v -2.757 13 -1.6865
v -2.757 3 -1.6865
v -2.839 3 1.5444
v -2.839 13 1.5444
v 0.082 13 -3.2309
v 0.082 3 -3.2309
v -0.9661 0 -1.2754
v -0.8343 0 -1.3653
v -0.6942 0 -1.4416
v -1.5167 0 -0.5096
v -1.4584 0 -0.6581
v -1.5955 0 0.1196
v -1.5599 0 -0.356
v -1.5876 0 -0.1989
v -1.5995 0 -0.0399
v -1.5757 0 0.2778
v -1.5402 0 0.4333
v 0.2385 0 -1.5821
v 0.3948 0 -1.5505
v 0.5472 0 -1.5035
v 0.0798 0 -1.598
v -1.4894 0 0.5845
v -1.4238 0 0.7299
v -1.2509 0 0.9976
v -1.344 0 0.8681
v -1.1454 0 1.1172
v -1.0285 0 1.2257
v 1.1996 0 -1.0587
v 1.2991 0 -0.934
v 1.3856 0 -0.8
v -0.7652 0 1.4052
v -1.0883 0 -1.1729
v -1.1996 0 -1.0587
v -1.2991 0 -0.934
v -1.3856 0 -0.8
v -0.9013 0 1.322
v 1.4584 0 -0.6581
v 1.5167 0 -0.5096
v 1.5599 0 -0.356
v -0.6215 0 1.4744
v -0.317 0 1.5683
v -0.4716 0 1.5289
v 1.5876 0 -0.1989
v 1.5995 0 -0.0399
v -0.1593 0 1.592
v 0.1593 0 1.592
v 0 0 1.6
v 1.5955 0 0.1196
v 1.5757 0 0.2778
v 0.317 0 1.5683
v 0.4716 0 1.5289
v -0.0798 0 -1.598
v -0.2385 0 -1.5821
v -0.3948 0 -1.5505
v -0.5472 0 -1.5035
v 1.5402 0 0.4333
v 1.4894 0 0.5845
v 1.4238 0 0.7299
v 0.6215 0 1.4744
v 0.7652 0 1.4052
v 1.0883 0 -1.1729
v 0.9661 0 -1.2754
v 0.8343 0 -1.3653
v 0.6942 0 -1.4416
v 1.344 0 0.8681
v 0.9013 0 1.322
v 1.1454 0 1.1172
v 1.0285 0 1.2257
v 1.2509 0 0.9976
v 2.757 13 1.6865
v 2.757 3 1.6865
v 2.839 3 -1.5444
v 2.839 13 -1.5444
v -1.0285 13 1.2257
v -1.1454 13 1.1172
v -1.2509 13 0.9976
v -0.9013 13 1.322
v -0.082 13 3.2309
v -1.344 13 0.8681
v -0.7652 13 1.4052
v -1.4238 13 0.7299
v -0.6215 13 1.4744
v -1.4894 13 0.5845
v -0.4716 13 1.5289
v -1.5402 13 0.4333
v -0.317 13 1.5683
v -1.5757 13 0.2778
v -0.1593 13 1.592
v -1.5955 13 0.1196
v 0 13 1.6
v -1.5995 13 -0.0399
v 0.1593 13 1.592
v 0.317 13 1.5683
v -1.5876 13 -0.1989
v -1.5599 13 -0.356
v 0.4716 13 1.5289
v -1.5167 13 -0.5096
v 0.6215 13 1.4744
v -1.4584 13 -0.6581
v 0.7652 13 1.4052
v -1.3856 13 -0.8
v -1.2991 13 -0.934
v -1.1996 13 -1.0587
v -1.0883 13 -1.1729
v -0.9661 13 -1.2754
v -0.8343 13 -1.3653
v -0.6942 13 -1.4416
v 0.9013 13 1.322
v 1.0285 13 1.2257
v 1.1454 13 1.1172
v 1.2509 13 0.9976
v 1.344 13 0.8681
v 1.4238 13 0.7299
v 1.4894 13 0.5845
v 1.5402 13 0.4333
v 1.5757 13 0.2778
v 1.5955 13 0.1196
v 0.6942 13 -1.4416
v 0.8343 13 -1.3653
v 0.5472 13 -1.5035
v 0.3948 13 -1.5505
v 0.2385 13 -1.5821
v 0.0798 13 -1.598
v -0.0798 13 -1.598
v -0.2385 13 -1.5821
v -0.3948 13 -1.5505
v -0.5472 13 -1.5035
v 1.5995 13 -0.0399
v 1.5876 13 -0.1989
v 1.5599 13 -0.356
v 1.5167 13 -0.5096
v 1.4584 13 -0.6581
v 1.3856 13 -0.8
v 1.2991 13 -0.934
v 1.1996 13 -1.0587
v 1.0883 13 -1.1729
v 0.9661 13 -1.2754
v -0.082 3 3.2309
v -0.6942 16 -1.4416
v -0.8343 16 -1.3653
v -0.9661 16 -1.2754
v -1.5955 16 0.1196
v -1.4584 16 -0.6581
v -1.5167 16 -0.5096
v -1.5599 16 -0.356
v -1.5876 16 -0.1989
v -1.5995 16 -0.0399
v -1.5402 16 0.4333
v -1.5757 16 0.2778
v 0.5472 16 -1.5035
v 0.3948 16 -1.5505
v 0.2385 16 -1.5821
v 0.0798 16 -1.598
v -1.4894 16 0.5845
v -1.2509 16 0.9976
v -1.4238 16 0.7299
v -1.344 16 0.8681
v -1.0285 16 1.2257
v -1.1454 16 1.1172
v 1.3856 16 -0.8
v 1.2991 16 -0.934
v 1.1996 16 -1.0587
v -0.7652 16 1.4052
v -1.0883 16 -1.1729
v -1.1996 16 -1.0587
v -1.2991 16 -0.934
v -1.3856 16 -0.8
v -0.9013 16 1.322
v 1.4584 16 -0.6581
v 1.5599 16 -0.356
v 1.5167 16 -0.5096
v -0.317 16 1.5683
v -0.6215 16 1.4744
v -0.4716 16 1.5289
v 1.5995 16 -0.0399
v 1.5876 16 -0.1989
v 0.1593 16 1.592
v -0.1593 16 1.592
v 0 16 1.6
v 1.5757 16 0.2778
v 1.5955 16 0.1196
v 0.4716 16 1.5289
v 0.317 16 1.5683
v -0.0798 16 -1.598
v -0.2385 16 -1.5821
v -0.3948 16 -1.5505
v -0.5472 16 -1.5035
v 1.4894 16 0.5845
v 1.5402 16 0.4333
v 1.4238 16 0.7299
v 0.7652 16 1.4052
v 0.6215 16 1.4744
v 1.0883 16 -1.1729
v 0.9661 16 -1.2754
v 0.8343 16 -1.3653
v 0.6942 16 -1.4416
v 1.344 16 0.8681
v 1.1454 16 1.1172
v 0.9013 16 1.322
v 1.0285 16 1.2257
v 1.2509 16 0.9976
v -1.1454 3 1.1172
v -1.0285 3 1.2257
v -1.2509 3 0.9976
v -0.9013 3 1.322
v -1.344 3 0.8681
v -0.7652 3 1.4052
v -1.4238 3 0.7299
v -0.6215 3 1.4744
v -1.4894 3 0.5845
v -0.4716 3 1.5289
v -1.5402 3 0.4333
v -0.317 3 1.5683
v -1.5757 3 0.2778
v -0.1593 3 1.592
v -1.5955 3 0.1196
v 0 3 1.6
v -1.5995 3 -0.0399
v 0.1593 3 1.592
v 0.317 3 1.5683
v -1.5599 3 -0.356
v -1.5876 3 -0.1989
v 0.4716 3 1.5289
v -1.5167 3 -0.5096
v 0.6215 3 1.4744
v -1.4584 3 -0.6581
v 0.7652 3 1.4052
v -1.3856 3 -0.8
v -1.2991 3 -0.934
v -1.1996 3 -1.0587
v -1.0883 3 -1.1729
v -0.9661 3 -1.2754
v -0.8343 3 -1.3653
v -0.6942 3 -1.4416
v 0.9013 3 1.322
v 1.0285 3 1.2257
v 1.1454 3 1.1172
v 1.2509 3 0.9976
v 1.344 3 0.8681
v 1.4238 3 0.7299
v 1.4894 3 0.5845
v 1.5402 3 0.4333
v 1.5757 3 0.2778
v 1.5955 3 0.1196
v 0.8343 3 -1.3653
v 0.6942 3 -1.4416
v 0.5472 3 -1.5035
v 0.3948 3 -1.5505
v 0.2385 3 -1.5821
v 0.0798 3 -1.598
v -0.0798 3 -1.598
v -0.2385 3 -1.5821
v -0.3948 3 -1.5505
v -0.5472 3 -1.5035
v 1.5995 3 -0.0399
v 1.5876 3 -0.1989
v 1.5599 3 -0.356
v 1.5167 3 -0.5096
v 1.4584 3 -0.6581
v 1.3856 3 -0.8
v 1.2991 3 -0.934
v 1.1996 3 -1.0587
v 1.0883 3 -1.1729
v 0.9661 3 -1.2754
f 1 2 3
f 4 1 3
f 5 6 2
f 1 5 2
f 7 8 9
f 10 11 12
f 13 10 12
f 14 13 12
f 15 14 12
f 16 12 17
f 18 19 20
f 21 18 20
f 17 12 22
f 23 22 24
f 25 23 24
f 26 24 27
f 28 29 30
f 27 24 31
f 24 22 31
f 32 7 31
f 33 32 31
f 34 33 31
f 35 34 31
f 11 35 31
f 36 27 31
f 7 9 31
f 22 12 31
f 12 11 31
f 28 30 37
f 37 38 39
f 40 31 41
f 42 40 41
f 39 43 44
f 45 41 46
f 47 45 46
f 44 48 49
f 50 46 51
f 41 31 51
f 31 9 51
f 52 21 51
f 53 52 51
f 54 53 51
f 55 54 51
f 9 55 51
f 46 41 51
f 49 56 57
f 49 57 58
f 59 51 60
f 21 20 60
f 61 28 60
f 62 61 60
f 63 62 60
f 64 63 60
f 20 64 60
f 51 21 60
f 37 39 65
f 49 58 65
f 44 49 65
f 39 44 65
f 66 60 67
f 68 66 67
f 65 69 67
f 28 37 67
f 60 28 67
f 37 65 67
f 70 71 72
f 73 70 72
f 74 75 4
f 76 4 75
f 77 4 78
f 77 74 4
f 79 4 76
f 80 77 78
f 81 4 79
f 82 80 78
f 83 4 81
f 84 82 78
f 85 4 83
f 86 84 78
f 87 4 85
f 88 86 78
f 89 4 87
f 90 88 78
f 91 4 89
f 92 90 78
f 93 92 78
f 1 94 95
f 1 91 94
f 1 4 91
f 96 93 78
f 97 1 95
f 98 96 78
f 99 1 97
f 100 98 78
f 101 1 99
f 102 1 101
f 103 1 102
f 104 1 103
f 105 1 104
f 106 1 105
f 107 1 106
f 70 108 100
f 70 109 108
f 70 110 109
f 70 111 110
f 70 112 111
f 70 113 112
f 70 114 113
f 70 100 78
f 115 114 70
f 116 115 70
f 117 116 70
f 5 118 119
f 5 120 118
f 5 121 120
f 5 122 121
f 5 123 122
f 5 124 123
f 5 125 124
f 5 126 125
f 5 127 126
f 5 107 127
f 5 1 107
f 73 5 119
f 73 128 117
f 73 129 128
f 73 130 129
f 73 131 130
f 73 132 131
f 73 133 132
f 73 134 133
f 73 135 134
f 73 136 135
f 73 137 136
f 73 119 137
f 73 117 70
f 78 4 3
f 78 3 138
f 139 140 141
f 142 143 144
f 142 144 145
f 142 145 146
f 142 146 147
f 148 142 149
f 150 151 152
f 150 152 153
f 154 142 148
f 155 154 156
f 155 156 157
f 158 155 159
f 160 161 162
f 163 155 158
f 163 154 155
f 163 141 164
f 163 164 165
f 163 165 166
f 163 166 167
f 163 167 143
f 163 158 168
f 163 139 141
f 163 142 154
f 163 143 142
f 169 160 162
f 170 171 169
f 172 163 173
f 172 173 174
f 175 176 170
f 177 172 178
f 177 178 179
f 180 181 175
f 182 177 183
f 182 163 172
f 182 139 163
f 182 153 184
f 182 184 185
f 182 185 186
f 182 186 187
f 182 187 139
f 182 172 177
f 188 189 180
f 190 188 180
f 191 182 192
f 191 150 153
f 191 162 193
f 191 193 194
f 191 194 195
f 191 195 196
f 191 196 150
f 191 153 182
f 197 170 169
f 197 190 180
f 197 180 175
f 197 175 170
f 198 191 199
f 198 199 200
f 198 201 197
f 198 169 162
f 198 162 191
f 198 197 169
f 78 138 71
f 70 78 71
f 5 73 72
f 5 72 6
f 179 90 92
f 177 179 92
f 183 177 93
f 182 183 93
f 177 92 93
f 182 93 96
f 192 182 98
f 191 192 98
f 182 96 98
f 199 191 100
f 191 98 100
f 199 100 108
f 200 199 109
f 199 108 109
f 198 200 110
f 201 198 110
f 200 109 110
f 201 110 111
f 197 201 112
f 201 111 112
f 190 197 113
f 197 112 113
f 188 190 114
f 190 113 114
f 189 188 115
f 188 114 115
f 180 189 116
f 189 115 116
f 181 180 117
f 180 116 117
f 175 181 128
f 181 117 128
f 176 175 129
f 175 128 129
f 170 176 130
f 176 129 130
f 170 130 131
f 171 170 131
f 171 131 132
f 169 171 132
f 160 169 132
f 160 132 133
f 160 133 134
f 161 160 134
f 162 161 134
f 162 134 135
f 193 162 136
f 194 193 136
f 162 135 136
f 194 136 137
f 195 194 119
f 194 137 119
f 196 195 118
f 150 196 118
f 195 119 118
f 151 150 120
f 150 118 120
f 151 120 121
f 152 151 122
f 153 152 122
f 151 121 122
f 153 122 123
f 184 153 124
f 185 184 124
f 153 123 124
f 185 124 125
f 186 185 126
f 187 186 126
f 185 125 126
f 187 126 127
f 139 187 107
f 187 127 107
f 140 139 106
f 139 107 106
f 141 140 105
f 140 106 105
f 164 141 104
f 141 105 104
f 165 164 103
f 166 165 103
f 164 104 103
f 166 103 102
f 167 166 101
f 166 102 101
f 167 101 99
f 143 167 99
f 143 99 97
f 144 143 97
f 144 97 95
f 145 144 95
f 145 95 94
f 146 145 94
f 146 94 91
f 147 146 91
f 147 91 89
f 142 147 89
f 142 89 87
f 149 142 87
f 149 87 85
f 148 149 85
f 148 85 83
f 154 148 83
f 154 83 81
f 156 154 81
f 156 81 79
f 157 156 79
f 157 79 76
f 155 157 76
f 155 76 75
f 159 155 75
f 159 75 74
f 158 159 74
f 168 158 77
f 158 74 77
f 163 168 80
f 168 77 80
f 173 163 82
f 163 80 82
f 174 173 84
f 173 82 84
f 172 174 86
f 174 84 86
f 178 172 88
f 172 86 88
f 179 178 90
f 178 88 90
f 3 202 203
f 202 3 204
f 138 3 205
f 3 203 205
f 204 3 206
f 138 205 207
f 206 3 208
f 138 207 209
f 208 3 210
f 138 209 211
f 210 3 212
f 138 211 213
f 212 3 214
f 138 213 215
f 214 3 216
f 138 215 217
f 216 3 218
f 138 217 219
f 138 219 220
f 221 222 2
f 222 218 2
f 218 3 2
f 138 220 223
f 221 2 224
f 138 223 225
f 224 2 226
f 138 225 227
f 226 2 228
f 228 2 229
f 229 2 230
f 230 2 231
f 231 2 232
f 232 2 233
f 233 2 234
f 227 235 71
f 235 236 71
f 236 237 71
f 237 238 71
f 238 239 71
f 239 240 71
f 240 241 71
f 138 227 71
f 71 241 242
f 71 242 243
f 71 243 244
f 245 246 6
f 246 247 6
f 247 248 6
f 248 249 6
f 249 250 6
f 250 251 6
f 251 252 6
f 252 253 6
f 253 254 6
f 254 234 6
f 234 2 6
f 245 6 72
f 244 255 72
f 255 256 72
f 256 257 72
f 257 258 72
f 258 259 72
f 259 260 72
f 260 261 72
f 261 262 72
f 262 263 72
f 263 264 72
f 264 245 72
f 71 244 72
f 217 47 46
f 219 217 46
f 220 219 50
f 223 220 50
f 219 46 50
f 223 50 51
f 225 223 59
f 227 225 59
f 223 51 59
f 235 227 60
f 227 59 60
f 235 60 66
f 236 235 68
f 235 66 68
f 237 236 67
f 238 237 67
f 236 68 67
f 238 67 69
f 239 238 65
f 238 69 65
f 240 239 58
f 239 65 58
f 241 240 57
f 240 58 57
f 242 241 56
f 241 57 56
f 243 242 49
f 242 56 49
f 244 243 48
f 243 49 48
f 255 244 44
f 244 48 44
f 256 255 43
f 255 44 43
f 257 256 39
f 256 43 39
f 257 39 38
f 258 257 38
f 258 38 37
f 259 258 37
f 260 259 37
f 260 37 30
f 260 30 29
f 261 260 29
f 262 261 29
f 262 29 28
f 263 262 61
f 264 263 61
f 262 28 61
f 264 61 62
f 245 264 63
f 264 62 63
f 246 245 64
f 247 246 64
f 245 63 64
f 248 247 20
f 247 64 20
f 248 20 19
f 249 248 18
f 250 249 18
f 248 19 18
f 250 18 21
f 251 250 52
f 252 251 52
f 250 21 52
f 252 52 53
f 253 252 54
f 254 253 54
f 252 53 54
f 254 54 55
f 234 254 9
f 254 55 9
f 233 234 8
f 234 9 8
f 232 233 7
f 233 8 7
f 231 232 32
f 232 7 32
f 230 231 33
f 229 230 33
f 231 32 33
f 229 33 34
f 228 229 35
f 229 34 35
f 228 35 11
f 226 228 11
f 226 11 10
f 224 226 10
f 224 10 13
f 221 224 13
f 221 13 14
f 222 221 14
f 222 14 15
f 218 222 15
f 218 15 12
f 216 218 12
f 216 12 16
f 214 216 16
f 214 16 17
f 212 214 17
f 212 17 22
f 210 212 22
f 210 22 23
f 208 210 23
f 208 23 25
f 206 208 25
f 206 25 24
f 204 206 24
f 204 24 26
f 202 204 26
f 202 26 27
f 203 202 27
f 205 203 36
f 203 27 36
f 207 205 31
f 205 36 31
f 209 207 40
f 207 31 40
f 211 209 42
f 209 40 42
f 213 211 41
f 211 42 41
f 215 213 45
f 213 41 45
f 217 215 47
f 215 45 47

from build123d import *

# Parameters (mm, degrees)
SKETCH_1_R      = 1.6
EXTRUDE_1_DEPTH = 3
EXTRUDE_2_DEPTH = 10
SKETCH_3_R      = 1.6
EXTRUDE_3_DEPTH = 3


with BuildPart() as part:
    # 草图1 → 凸台-拉伸1 (new body)
    with BuildSketch(Plane(origin=(0, 0, 0), x_dir=(1, 0, 0), z_dir=(0, 1, 0))):
        with Locations(Location((0, 0, 0), (0, 0, 270))):
            Circle(SKETCH_1_R)
    extrude(amount=EXTRUDE_1_DEPTH)

    # 草图2 → 凸台-拉伸2 (add)
    with BuildSketch(Plane(origin=(0, 3, 0), x_dir=(1, 0, 0), z_dir=(0, 1, 0))):
        Polygon((2.757018897, -1.686460265), (2.839026881, 1.544418271), (0.082007983, 3.230878536), (-2.757018897, 1.686460265), (-2.839026881, -1.544418271), (-0.082007983, -3.230878536), align=None)
    extrude(amount=EXTRUDE_2_DEPTH)

    # 草图3 → 凸台-拉伸3 (add)
    with BuildSketch(Plane(origin=(0, 13, 0), x_dir=(1, 0, 0), z_dir=(0, 1, 0))):
        with Locations(Location((0, 0, 0), (0, 0, 270))):
            Circle(SKETCH_3_R)
    extrude(amount=EXTRUDE_3_DEPTH)


solid = part.part
